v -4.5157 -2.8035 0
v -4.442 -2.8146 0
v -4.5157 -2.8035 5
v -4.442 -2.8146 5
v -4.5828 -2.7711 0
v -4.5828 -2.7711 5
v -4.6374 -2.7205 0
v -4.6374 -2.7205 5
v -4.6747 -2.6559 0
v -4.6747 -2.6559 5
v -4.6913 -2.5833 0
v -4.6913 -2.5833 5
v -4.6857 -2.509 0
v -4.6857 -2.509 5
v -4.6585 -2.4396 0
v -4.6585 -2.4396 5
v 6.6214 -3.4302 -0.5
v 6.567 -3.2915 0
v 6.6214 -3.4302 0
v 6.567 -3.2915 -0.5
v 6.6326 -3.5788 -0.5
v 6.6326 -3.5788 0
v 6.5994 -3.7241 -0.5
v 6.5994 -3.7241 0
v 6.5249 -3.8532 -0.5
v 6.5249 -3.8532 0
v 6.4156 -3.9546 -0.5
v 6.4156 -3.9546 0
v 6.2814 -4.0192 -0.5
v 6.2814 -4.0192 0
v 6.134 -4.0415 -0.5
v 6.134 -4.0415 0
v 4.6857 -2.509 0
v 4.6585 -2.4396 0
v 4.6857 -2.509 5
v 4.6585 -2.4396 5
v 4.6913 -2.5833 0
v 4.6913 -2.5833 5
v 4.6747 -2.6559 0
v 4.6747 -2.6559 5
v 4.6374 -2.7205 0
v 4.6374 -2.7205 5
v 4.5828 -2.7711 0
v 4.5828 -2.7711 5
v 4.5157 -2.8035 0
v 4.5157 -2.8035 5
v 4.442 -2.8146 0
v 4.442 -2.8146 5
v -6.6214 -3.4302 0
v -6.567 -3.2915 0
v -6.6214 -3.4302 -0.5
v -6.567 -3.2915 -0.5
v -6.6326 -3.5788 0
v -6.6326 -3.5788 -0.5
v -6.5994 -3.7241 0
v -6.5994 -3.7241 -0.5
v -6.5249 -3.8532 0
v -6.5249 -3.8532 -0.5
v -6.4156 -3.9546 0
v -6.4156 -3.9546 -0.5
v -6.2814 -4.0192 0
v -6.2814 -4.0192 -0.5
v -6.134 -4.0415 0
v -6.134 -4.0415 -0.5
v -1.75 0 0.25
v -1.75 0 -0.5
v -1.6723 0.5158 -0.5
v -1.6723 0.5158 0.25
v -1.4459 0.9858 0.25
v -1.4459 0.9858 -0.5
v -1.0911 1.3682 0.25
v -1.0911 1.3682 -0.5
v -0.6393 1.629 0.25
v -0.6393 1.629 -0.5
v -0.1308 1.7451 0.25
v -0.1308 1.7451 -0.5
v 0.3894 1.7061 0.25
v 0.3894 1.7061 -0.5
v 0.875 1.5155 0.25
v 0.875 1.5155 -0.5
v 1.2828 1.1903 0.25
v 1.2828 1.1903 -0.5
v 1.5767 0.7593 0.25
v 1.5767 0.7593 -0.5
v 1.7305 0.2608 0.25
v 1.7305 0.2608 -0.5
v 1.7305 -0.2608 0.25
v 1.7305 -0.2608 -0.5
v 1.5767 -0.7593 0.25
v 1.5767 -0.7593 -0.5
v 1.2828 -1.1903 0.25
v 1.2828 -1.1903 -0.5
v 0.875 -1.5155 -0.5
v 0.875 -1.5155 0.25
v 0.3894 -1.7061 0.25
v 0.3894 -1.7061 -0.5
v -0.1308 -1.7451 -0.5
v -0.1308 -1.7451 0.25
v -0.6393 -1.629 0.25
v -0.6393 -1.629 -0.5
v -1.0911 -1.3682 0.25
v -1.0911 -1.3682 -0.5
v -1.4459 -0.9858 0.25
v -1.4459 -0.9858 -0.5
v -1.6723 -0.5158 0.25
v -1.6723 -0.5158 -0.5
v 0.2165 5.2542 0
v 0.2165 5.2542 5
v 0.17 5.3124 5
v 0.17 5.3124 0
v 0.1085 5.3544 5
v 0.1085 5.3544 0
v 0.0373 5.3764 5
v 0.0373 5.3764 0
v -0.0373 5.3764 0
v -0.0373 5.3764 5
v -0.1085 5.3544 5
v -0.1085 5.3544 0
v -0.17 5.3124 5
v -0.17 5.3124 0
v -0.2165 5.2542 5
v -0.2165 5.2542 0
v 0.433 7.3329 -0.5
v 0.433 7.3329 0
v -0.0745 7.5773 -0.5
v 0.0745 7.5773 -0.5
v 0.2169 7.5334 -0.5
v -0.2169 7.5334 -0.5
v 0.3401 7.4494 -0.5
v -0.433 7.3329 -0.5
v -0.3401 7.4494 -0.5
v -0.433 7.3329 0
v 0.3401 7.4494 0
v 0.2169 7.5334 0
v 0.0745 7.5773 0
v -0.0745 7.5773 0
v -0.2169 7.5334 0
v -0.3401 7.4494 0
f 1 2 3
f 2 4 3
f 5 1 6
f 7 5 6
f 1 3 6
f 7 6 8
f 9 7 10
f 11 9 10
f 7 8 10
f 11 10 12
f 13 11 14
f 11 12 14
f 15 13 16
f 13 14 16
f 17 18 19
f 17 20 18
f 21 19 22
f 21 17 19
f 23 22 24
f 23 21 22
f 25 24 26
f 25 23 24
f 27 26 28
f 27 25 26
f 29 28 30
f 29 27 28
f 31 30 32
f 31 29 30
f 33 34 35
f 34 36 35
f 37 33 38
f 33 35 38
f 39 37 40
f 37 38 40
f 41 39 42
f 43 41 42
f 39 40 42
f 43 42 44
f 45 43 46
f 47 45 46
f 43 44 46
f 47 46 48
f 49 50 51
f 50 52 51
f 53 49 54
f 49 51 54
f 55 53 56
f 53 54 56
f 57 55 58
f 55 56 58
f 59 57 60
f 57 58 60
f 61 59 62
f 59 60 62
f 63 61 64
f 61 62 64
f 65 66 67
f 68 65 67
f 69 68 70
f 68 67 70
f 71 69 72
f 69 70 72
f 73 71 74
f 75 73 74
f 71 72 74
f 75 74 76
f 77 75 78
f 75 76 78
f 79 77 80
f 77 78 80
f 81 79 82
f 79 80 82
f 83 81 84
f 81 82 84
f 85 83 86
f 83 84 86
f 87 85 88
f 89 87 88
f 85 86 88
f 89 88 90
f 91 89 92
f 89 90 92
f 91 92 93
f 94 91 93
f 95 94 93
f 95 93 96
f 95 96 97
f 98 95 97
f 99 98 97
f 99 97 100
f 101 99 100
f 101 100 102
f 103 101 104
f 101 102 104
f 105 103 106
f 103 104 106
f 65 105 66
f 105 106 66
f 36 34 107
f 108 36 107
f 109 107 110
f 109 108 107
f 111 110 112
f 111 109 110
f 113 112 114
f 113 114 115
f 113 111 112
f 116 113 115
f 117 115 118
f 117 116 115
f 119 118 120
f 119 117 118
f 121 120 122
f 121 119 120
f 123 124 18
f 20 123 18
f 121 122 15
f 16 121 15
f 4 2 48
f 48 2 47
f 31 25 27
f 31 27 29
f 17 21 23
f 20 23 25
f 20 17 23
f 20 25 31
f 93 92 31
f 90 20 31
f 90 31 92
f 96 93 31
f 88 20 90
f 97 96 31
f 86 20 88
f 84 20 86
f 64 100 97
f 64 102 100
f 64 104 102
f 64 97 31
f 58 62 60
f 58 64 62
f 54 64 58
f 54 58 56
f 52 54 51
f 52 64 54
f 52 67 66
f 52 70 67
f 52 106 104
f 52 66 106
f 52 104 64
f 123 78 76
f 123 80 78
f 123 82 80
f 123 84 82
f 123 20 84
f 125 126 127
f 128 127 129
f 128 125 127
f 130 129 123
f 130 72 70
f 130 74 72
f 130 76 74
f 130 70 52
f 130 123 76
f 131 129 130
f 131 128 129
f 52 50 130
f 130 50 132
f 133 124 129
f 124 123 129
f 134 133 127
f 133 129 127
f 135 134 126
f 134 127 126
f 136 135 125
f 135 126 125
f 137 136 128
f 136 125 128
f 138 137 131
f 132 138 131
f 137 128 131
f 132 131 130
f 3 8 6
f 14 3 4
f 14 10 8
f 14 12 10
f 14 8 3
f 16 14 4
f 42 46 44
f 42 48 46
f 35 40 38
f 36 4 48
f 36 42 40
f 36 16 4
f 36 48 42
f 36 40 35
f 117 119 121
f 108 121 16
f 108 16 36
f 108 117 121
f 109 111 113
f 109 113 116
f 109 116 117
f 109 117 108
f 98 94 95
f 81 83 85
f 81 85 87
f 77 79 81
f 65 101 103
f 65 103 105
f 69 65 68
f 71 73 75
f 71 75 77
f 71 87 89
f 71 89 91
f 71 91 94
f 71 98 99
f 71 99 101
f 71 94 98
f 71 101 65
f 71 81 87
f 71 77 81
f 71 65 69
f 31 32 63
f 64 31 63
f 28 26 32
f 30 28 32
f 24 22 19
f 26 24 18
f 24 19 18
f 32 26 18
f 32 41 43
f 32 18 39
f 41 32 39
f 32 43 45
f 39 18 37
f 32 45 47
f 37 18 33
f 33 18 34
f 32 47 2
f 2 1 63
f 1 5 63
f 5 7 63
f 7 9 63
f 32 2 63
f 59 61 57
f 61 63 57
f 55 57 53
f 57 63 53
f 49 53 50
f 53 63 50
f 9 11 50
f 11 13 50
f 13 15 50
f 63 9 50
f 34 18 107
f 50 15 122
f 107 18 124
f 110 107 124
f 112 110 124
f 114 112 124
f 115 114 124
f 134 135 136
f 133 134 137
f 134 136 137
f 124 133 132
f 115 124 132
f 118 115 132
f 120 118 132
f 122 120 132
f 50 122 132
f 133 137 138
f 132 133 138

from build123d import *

# Parameters (mm, degrees)
BOSS_EXTRUDE1_DEPTH = 5
BOSS_EXTRUDE2_DEPTH = 0.5
FILLET1_R           = 0.5
FILLET2_R           = 0.25
SKETCH3_R           = 1.75
CUT_EXTRUDE1_DEPTH  = 0.75


with BuildPart() as part:
    # Sketch1 → Boss-Extrude1 (new body)
    with BuildSketch(Plane.XY):
        Polygon((0, 5.629165125), (-4.875, -2.814582562), (4.875, -2.814582562), align=None)
    extrude(amount=BOSS_EXTRUDE1_DEPTH)

    # Sketch2 → Boss-Extrude2 (add)
    with BuildSketch(Plane(origin=(0, 0, 0), x_dir=(-1, 0, 0), z_dir=(0, 0, -1))):
        Polygon((0, 8.082903769), (-7, -4.041451884), (7, -4.041451884), align=None)
    extrude(amount=BOSS_EXTRUDE2_DEPTH)

    # Fillet1
    fillet1_edges = [part.edges().sort_by_distance(p)[0] for p in [
        (-7, -4.041451884, -0.25),
        (0, 8.082903769, -0.25),
        (7, -4.041451884, -0.25),
    ]]
    fillet(fillet1_edges, radius=FILLET1_R)

    # Fillet2
    fillet2_edges = [part.edges().sort_by_distance(p)[0] for p in [
        (4.875, -2.814582562, 2.5),
        (-4.875, -2.814582562, 2.5),
        (0, 5.629165125, 2.5),
    ]]
    fillet(fillet2_edges, radius=FILLET2_R)

    # Sketch3 → Cut-Extrude1 (cut)
    with BuildSketch(Plane(origin=(0, 0, -0.5), x_dir=(-1, 0, 0), z_dir=(0, 0, -1))):
        Circle(SKETCH3_R)
    extrude(amount=-CUT_EXTRUDE1_DEPTH, mode=Mode.SUBTRACT)


solid = part.part
